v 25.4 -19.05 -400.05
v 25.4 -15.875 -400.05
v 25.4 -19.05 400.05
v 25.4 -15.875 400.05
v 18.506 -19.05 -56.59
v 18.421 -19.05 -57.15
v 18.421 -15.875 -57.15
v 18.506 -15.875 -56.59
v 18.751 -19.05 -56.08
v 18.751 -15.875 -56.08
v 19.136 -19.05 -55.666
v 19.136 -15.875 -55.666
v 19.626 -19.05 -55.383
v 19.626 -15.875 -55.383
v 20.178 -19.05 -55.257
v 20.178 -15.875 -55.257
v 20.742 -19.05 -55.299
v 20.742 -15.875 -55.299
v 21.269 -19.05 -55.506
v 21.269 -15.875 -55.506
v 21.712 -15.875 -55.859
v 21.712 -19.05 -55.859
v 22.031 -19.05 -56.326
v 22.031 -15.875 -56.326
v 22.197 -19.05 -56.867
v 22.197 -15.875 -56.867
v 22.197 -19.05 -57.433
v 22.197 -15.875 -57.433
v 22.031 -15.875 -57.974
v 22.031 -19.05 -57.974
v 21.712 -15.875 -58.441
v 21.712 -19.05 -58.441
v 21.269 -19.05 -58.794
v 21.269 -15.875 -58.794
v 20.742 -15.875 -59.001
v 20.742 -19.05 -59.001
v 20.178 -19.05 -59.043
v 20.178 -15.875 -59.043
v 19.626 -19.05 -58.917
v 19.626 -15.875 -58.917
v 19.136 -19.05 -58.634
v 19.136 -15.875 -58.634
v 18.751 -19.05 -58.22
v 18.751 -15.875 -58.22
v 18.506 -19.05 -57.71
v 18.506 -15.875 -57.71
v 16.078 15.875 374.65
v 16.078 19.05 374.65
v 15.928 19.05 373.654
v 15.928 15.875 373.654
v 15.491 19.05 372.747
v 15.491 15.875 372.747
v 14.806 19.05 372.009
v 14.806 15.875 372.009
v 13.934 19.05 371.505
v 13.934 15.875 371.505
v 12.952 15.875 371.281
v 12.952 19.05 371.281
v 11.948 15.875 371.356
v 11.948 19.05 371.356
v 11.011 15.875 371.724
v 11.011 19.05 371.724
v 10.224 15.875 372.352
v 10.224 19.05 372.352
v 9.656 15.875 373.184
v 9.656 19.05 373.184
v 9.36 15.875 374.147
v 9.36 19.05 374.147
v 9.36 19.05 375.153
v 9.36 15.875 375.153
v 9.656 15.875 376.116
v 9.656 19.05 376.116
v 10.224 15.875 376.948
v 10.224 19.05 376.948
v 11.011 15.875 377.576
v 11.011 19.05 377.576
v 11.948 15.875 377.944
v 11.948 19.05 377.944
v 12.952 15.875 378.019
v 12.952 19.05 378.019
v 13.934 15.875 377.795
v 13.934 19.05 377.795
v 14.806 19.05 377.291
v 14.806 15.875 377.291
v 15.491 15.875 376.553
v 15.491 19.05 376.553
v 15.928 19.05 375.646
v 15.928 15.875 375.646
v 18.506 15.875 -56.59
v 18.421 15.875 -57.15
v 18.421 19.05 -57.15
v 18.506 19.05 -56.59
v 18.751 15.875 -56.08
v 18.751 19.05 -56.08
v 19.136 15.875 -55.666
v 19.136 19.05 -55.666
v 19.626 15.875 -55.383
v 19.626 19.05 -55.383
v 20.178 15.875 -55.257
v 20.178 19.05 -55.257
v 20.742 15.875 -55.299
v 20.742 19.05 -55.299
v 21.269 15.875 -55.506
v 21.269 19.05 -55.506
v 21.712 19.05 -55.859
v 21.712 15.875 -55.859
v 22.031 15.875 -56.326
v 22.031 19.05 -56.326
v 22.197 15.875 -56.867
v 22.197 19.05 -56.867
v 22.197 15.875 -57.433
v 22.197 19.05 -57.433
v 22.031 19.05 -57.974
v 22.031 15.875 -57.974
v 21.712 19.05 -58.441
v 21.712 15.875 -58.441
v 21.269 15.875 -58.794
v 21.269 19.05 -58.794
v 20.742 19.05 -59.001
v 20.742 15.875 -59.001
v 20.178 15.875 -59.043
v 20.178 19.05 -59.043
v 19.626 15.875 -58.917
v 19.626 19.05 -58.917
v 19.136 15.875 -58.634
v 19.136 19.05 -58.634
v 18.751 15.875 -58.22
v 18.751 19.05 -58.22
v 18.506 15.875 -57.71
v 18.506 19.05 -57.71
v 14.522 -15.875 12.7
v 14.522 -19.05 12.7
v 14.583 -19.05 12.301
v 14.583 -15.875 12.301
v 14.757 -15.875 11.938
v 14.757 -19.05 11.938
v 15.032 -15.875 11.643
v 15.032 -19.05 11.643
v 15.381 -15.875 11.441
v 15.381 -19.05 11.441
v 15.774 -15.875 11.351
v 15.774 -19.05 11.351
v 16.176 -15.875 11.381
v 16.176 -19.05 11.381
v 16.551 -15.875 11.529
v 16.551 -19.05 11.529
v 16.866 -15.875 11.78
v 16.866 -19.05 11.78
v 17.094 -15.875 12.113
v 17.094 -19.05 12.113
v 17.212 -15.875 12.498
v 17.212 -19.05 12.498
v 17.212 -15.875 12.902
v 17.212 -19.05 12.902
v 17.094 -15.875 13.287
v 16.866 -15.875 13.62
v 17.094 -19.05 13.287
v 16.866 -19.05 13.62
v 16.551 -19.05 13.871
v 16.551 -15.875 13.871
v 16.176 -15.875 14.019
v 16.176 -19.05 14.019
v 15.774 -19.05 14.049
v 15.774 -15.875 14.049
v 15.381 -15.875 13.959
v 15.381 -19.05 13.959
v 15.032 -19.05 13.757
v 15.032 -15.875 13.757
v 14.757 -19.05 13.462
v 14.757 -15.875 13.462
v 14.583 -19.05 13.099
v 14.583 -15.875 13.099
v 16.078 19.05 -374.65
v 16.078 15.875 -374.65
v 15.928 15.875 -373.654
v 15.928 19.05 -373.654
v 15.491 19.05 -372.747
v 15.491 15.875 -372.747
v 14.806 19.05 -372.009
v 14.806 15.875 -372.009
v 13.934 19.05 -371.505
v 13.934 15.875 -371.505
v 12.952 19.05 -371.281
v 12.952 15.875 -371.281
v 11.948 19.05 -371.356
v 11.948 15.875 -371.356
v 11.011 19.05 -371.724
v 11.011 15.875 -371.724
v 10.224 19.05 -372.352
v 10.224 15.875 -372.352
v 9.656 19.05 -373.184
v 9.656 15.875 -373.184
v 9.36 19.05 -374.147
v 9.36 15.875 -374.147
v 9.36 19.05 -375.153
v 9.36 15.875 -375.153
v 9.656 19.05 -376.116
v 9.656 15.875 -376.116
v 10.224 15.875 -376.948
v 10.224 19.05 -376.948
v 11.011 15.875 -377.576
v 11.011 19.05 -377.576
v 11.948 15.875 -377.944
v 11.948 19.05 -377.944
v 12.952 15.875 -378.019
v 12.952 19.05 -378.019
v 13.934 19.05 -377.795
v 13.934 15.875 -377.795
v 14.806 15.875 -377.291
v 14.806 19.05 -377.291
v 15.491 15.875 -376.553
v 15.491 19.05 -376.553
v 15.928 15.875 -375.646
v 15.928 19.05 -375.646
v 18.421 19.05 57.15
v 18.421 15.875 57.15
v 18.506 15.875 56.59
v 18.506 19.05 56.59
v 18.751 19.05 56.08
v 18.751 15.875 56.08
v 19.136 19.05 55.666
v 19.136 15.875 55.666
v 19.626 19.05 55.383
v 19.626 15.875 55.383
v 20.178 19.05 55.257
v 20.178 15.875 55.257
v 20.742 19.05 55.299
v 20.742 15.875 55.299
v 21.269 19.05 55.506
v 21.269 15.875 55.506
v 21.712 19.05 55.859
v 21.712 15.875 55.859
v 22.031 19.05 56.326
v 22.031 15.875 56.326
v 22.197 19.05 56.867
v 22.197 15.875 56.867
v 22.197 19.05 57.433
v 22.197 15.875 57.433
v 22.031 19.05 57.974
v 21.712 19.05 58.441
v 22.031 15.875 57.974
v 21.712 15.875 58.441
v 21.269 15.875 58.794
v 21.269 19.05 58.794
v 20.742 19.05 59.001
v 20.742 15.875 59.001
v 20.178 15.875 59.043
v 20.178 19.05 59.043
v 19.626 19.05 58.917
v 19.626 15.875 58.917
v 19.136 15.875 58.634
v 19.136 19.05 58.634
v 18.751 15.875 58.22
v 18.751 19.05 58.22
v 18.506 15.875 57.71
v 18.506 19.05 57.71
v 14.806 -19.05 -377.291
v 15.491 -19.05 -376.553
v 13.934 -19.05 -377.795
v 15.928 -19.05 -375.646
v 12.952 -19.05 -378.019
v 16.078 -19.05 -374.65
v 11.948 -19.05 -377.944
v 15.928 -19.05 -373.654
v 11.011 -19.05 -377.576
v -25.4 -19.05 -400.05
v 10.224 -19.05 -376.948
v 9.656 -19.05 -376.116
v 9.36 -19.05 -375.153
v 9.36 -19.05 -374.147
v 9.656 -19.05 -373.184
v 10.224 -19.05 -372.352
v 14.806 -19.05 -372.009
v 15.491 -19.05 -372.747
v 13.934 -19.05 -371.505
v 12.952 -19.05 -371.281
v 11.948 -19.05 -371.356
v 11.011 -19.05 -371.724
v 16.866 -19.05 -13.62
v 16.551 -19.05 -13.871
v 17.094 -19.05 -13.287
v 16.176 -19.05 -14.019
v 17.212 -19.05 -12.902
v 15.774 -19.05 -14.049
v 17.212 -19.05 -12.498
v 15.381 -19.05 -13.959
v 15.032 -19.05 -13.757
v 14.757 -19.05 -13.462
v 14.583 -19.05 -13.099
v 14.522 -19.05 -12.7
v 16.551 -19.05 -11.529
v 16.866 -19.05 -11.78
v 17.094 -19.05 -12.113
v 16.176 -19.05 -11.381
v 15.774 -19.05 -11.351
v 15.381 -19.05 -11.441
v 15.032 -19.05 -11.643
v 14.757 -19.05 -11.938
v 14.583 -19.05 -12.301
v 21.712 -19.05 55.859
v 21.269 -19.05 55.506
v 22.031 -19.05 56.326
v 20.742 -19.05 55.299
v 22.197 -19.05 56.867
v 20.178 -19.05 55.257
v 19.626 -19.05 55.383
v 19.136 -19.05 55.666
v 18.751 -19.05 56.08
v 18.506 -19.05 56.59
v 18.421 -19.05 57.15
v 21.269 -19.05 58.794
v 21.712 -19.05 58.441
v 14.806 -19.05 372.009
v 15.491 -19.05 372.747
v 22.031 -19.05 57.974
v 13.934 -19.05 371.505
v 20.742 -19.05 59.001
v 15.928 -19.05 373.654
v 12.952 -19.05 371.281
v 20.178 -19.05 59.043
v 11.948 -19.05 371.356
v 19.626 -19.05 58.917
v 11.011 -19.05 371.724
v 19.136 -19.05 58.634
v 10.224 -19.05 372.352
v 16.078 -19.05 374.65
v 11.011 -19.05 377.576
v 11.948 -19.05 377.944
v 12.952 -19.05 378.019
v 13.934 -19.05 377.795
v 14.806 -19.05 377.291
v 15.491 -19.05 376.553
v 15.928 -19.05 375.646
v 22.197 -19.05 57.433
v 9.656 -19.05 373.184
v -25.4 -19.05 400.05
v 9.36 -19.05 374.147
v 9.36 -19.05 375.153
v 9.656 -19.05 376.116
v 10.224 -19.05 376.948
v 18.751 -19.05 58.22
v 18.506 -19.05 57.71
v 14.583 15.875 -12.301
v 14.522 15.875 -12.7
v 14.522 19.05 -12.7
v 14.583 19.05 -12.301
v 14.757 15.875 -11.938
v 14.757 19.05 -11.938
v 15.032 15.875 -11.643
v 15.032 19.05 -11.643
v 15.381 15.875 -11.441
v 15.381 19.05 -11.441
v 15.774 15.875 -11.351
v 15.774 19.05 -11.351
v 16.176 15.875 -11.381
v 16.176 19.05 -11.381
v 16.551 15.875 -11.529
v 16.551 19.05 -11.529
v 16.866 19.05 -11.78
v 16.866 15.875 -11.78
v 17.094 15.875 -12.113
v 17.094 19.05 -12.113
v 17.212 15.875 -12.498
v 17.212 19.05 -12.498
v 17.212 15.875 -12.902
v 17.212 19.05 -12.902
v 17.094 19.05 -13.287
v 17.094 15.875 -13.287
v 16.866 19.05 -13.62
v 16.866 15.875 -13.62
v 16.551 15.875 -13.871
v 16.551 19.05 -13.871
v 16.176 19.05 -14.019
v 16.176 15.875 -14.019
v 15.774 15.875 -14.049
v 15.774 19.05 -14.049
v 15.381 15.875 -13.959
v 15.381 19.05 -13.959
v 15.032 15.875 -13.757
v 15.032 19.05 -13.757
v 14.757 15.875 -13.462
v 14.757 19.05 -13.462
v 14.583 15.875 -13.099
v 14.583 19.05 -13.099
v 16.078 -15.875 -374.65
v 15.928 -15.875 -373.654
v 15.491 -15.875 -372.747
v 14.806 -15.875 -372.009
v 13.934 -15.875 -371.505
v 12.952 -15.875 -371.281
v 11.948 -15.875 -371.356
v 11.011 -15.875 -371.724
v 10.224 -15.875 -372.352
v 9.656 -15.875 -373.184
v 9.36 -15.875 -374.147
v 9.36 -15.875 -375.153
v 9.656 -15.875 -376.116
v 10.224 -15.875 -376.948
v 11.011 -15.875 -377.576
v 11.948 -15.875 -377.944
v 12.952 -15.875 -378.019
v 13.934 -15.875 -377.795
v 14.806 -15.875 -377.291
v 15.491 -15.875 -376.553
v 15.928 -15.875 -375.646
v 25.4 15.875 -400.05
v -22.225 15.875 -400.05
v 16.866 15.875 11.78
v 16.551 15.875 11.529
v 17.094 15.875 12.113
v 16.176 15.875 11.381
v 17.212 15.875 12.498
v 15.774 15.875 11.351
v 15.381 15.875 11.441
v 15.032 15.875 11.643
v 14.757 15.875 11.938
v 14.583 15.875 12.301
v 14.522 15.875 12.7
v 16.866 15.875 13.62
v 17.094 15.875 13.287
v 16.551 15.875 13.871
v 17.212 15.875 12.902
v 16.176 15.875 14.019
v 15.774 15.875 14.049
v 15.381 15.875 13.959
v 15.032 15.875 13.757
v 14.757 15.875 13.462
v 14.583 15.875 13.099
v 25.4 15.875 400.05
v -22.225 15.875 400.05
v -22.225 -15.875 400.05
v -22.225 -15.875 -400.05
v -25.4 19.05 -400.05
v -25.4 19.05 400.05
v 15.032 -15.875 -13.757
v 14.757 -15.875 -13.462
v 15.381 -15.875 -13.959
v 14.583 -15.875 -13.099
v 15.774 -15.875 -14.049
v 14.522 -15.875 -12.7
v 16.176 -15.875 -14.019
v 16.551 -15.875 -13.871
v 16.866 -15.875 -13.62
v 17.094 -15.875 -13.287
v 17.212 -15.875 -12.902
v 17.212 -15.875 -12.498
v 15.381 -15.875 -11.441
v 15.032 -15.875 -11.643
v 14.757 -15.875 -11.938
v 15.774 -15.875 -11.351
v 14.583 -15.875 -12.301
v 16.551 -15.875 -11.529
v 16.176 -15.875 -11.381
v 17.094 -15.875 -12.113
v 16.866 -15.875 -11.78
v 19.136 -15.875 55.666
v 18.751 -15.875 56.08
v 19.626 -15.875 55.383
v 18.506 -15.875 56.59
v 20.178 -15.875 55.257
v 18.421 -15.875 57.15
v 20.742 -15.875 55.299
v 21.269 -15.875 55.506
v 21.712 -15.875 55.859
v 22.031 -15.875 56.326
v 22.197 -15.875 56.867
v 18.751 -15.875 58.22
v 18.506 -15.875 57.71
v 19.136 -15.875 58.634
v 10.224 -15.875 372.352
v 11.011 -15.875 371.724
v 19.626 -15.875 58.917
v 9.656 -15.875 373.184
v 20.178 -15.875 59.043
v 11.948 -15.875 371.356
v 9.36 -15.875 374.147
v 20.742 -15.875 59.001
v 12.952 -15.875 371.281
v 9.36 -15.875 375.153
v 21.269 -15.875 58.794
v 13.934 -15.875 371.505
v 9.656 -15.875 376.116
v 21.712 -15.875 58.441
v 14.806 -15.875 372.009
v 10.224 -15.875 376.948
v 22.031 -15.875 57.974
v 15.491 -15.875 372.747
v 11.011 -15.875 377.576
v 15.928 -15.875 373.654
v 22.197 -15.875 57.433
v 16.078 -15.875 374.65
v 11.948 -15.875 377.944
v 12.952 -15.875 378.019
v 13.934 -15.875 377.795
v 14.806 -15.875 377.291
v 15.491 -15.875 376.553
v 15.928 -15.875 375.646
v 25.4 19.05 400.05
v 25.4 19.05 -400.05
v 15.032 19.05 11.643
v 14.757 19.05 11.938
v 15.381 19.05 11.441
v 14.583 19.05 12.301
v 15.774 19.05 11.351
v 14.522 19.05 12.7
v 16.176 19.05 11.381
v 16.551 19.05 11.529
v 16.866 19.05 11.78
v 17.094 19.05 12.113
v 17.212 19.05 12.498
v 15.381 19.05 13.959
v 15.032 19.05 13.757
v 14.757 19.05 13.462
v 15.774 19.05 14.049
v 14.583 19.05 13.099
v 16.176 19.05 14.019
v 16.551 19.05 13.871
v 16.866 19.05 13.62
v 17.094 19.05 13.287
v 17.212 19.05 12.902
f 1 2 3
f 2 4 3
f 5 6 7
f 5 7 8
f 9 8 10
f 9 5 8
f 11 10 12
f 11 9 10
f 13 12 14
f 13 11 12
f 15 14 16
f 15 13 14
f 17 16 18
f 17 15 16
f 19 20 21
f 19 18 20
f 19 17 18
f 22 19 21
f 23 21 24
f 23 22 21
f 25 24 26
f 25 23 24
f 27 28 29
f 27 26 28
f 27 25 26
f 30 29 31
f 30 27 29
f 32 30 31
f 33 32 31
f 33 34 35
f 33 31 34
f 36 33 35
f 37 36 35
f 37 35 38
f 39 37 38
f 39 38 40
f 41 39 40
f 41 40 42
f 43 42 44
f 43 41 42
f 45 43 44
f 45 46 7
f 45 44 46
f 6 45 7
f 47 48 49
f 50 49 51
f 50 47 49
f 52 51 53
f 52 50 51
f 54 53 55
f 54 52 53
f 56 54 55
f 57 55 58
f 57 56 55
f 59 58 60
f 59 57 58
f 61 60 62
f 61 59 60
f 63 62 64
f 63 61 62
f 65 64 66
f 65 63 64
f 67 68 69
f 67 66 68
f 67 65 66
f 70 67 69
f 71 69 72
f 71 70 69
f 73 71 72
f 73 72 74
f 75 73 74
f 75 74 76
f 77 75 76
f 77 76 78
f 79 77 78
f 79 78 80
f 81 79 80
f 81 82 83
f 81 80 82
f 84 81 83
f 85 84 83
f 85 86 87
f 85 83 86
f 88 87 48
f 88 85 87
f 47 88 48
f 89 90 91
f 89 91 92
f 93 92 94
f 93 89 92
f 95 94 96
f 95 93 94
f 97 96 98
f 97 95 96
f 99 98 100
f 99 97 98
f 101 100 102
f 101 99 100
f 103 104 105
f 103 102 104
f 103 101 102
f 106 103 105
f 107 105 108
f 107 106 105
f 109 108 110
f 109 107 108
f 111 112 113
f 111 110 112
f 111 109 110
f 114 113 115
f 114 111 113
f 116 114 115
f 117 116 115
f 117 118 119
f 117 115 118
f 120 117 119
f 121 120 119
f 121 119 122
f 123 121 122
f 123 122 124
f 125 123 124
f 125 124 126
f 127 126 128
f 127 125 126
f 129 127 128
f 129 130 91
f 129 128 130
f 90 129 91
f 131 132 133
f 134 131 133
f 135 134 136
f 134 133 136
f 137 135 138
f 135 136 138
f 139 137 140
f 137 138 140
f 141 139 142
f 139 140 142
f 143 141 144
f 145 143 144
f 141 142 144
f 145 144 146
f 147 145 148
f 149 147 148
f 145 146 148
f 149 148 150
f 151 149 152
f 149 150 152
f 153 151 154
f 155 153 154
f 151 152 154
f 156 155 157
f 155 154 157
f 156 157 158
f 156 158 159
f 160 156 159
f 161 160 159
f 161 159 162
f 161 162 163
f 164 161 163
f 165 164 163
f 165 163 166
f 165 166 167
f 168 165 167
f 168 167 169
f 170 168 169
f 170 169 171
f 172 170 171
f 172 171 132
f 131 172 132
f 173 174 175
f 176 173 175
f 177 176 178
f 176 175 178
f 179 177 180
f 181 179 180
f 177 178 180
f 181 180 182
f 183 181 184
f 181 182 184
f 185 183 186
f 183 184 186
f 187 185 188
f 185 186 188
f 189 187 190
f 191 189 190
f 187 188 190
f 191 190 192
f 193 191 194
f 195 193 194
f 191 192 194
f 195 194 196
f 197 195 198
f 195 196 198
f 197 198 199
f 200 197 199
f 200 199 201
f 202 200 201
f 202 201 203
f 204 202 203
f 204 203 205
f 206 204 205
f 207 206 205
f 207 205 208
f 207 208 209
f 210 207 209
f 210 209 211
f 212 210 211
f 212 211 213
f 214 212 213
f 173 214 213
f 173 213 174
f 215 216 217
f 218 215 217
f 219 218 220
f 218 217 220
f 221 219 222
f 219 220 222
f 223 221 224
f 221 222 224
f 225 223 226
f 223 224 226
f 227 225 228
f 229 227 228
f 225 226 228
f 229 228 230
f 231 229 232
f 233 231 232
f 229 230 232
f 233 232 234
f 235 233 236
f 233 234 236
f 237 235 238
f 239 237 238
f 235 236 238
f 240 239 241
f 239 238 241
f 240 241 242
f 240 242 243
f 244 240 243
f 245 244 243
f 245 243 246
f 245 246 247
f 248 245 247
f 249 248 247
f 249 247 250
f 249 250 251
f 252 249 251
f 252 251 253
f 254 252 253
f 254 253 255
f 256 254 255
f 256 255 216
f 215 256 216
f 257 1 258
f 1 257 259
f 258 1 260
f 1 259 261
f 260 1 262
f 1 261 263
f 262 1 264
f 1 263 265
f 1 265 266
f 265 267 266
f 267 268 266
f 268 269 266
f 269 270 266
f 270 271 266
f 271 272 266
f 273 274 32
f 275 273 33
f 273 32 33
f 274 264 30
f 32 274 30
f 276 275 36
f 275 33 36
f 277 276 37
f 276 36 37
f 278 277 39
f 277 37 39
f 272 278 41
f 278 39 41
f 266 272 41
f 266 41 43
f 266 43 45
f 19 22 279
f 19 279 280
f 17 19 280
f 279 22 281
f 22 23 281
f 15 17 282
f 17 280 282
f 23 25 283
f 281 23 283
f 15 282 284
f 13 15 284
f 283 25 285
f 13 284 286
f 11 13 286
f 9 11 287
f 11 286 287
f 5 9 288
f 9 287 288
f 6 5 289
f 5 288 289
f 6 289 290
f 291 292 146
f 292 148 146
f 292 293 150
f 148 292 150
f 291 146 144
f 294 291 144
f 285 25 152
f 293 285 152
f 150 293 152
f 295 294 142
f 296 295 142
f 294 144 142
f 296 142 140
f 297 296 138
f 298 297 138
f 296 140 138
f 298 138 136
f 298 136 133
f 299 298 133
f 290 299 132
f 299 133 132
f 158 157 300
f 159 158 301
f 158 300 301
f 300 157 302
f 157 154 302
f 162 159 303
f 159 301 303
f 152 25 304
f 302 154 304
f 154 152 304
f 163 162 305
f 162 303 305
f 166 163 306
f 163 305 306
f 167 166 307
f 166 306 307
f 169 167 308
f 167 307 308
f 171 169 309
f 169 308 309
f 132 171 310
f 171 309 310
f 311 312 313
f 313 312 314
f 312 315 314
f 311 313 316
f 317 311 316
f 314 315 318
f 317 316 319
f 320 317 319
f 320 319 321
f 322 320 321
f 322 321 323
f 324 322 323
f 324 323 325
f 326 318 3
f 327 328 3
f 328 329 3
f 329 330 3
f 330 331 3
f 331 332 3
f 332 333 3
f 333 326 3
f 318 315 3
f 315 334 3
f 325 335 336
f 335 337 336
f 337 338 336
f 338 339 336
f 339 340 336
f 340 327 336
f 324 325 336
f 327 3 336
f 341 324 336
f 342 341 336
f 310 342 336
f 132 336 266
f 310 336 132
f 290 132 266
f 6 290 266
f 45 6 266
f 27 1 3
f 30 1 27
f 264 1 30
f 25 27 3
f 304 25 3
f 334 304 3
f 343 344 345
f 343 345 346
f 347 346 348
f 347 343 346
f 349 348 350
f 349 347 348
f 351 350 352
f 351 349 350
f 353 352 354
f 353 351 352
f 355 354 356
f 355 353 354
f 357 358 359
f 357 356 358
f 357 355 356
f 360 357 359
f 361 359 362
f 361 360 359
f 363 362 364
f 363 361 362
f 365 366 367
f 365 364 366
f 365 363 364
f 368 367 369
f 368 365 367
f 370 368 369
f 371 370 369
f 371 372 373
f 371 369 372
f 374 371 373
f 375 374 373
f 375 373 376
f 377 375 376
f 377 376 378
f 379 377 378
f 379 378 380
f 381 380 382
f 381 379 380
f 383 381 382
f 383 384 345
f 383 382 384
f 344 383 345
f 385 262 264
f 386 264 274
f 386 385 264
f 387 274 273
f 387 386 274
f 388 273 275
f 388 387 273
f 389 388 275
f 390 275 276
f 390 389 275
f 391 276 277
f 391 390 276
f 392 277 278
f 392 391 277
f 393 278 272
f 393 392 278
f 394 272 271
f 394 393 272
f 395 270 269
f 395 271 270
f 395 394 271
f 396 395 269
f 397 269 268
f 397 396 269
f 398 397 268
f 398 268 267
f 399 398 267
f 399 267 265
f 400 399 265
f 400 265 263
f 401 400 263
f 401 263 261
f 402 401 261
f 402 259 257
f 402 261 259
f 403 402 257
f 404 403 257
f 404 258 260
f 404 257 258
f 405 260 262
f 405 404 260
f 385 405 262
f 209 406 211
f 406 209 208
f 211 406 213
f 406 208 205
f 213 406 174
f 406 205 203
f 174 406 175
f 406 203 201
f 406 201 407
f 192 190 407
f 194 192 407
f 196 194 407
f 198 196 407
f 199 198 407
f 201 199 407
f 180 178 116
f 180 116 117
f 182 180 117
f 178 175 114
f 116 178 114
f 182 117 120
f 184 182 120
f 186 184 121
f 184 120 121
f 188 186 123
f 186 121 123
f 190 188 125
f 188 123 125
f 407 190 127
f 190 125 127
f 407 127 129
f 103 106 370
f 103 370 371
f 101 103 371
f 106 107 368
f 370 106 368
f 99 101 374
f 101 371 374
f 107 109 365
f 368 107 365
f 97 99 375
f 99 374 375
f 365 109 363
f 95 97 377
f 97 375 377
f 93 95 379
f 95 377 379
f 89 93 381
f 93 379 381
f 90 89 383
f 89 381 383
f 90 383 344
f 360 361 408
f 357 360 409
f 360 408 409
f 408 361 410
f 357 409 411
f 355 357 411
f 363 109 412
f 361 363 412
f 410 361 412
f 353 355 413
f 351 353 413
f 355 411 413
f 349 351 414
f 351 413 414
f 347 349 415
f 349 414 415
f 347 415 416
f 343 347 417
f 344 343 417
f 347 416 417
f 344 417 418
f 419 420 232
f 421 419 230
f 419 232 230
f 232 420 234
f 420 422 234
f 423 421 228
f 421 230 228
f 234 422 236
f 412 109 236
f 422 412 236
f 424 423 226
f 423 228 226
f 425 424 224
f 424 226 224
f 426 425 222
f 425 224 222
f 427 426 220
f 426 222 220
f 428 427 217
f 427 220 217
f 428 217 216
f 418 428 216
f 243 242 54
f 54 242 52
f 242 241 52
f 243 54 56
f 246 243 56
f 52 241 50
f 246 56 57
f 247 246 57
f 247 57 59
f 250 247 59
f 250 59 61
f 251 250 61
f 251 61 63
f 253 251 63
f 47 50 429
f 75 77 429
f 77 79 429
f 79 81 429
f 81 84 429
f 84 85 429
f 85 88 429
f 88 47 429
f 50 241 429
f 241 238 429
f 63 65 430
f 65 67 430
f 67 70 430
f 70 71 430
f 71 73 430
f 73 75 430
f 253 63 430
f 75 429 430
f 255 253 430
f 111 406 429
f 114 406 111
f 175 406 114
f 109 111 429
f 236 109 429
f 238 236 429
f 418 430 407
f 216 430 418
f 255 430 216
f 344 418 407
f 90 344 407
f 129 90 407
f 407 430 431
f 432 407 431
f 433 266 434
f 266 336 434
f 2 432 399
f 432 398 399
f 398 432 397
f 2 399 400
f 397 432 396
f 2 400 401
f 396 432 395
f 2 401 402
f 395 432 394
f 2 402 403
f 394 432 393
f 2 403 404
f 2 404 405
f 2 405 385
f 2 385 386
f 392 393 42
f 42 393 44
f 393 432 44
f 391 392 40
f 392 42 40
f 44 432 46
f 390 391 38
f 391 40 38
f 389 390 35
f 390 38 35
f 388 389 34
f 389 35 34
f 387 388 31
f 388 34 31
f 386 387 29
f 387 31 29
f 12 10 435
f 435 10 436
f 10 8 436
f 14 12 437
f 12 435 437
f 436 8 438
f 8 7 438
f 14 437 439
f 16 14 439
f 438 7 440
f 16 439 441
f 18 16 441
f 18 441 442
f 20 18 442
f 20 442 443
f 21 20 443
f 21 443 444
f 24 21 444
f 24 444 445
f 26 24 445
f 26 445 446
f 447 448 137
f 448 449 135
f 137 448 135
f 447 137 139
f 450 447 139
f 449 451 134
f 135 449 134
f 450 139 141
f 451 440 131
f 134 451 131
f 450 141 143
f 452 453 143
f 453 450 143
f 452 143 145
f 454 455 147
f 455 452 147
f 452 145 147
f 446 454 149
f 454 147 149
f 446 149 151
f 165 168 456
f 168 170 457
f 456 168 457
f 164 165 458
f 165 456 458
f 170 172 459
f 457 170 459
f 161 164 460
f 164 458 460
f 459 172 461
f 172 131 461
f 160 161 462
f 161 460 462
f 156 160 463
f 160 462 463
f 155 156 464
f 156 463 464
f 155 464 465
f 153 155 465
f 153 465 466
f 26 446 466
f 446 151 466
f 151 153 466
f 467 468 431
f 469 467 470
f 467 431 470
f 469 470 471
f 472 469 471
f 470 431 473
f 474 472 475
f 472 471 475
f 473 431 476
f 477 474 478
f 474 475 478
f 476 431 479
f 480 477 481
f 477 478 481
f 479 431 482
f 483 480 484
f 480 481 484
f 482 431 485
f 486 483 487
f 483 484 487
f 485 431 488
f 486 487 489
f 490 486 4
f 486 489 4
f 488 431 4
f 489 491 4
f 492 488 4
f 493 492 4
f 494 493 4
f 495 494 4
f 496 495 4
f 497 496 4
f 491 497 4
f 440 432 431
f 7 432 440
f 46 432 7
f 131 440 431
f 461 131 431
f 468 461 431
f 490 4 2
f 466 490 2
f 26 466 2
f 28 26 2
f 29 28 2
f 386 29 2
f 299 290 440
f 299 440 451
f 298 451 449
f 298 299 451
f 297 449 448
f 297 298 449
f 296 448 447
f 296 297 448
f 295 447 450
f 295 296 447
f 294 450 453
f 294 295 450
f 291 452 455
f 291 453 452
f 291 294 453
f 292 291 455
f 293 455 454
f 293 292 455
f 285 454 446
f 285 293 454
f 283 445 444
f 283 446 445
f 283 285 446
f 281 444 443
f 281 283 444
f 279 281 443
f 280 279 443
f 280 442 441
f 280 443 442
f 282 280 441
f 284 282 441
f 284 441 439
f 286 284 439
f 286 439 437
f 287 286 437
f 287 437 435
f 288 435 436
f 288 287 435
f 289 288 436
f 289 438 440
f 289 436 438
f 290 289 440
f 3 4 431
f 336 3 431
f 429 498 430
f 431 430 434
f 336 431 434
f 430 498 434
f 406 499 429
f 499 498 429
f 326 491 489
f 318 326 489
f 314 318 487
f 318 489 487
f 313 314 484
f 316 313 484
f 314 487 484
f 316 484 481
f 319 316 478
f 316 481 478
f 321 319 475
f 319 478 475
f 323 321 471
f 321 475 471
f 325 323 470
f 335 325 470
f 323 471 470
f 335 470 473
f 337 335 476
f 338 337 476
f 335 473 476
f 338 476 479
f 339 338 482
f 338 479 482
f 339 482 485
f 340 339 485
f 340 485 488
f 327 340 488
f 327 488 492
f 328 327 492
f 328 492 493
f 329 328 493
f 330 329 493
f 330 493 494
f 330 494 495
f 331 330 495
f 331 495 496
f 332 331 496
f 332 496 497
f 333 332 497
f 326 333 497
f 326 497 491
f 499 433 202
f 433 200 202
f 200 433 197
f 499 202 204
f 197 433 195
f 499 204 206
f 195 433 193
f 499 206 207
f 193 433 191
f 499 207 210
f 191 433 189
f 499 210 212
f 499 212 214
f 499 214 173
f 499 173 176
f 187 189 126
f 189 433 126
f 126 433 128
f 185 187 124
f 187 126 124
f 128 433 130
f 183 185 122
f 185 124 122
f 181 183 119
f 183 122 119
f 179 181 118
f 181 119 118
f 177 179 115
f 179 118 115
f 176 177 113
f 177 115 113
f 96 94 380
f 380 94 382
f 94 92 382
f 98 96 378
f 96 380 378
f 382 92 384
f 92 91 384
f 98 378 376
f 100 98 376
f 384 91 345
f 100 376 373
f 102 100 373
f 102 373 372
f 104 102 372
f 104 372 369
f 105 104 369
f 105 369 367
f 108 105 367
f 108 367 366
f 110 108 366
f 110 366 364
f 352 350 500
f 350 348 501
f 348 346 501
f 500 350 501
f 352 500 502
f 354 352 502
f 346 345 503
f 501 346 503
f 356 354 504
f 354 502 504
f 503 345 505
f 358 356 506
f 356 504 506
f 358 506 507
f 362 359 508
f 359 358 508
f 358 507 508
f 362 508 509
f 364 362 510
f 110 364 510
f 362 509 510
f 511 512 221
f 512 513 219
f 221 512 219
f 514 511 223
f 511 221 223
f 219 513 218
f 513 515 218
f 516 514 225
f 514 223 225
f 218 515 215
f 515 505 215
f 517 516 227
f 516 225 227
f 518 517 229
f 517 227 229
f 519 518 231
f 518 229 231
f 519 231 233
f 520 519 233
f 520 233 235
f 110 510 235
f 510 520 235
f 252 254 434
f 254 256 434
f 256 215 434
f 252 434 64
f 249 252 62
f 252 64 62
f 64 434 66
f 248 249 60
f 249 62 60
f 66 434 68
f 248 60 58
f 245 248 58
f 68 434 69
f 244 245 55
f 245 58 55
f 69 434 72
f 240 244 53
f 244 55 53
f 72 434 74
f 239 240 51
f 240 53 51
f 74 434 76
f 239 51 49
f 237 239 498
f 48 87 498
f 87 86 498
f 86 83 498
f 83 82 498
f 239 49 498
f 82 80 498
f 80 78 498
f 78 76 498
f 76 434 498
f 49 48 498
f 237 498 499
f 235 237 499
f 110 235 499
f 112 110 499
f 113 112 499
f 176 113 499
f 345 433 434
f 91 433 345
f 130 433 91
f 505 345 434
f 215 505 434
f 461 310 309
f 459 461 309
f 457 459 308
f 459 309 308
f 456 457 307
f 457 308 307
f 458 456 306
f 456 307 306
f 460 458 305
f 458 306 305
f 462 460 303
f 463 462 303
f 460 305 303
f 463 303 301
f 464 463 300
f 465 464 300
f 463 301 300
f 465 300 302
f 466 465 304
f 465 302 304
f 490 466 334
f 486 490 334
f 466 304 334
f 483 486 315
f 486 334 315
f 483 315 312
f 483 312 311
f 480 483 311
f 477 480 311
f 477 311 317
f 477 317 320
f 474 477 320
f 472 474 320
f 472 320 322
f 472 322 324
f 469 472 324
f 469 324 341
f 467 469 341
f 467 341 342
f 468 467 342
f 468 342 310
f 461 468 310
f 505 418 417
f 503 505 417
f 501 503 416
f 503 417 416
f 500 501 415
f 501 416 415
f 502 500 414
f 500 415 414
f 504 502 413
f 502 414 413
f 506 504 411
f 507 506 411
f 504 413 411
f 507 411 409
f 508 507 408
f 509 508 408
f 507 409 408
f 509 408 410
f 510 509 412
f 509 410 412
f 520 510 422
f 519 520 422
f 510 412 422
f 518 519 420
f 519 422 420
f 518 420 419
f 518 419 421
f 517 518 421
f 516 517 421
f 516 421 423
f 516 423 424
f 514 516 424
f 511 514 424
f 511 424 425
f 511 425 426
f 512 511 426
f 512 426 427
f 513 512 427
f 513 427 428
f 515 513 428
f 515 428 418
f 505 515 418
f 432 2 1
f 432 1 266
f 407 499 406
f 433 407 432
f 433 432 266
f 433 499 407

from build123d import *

# Parameters (mm, degrees)
BOSS_EXTRUDE1_DEPTH         = 400.05
F_6_32_TAPPED_HOLE1_D       = 2.7051
F_6_CLEARANCE_HOLE1_D       = 3.7973
F_1_4_CLEARANCE_HOLE1_D     = 6.7564
F_1_4_CLEARANCE_HOLE1_DEPTH = 3.175
MIRROR3_COPY_1_D            = 6.7564
MIRROR3_COPY_1_DEPTH        = 3.175


with BuildPart() as part:
    # Sketch1 → Boss-Extrude1 (new, symmetric)
    with BuildSketch(Plane.XY):
        Polygon((-22.225, -15.875), (25.4, -15.875), (25.4, -19.05), (-25.4, -19.05), (-25.4, 19.05), (25.4, 19.05), (25.4, 15.875), (-22.225, 15.875), align=None)
    extrude(amount=BOSS_EXTRUDE1_DEPTH, both=True)

    # #6-32 Tapped Hole1 (through all)
    with Locations(Plane(origin=(0, 19.05, 0), x_dir=(1, 0, 0), z_dir=(0, 1, 0))):
        with Locations((15.875, -12.7)):
            f_6_32_tapped_hole1 = Hole(F_6_32_TAPPED_HOLE1_D / 2)

    # #6 Clearance Hole1 (through all)
    with Locations(Plane(origin=(0, 19.05, 0), x_dir=(1, 0, 0), z_dir=(0, 1, 0))):
        with Locations((20.32, -57.15)):
            f_6_clearance_hole1 = Hole(F_6_CLEARANCE_HOLE1_D / 2)

    # 1/4 Clearance Hole1
    with Locations(Plane(origin=(0, -19.05, 0), x_dir=(-1, 0, 0), z_dir=(0, -1, 0))):
        with Locations((-12.7, -374.65)):
            f_1_4_clearance_hole1 = Hole(F_1_4_CLEARANCE_HOLE1_D / 2, depth=F_1_4_CLEARANCE_HOLE1_DEPTH)

    # Mirror2: 1/4 Clearance Hole1 across plane
    add(f_1_4_clearance_hole1.mirror(Plane.ZX), mode=Mode.SUBTRACT)

    # Mirror3: 1/4 Clearance Hole1 across plane
    add(f_1_4_clearance_hole1.mirror(Plane.XY), mode=Mode.SUBTRACT)

    # Mirror3 copy 1
    with Locations(Plane(origin=(0, 19.05, 0), x_dir=(-1, 0, 0), z_dir=(0, 1, 0))):
        with Locations((-12.7, -374.65)):
            Hole(MIRROR3_COPY_1_D / 2, depth=MIRROR3_COPY_1_DEPTH)

    # Mirror4: #6-32 Tapped Hole1, #6 Clearance Hole1 across plane
    add(f_6_32_tapped_hole1.mirror(Plane.XY), mode=Mode.SUBTRACT)
    add(f_6_clearance_hole1.mirror(Plane.XY), mode=Mode.SUBTRACT)


solid = part.part
